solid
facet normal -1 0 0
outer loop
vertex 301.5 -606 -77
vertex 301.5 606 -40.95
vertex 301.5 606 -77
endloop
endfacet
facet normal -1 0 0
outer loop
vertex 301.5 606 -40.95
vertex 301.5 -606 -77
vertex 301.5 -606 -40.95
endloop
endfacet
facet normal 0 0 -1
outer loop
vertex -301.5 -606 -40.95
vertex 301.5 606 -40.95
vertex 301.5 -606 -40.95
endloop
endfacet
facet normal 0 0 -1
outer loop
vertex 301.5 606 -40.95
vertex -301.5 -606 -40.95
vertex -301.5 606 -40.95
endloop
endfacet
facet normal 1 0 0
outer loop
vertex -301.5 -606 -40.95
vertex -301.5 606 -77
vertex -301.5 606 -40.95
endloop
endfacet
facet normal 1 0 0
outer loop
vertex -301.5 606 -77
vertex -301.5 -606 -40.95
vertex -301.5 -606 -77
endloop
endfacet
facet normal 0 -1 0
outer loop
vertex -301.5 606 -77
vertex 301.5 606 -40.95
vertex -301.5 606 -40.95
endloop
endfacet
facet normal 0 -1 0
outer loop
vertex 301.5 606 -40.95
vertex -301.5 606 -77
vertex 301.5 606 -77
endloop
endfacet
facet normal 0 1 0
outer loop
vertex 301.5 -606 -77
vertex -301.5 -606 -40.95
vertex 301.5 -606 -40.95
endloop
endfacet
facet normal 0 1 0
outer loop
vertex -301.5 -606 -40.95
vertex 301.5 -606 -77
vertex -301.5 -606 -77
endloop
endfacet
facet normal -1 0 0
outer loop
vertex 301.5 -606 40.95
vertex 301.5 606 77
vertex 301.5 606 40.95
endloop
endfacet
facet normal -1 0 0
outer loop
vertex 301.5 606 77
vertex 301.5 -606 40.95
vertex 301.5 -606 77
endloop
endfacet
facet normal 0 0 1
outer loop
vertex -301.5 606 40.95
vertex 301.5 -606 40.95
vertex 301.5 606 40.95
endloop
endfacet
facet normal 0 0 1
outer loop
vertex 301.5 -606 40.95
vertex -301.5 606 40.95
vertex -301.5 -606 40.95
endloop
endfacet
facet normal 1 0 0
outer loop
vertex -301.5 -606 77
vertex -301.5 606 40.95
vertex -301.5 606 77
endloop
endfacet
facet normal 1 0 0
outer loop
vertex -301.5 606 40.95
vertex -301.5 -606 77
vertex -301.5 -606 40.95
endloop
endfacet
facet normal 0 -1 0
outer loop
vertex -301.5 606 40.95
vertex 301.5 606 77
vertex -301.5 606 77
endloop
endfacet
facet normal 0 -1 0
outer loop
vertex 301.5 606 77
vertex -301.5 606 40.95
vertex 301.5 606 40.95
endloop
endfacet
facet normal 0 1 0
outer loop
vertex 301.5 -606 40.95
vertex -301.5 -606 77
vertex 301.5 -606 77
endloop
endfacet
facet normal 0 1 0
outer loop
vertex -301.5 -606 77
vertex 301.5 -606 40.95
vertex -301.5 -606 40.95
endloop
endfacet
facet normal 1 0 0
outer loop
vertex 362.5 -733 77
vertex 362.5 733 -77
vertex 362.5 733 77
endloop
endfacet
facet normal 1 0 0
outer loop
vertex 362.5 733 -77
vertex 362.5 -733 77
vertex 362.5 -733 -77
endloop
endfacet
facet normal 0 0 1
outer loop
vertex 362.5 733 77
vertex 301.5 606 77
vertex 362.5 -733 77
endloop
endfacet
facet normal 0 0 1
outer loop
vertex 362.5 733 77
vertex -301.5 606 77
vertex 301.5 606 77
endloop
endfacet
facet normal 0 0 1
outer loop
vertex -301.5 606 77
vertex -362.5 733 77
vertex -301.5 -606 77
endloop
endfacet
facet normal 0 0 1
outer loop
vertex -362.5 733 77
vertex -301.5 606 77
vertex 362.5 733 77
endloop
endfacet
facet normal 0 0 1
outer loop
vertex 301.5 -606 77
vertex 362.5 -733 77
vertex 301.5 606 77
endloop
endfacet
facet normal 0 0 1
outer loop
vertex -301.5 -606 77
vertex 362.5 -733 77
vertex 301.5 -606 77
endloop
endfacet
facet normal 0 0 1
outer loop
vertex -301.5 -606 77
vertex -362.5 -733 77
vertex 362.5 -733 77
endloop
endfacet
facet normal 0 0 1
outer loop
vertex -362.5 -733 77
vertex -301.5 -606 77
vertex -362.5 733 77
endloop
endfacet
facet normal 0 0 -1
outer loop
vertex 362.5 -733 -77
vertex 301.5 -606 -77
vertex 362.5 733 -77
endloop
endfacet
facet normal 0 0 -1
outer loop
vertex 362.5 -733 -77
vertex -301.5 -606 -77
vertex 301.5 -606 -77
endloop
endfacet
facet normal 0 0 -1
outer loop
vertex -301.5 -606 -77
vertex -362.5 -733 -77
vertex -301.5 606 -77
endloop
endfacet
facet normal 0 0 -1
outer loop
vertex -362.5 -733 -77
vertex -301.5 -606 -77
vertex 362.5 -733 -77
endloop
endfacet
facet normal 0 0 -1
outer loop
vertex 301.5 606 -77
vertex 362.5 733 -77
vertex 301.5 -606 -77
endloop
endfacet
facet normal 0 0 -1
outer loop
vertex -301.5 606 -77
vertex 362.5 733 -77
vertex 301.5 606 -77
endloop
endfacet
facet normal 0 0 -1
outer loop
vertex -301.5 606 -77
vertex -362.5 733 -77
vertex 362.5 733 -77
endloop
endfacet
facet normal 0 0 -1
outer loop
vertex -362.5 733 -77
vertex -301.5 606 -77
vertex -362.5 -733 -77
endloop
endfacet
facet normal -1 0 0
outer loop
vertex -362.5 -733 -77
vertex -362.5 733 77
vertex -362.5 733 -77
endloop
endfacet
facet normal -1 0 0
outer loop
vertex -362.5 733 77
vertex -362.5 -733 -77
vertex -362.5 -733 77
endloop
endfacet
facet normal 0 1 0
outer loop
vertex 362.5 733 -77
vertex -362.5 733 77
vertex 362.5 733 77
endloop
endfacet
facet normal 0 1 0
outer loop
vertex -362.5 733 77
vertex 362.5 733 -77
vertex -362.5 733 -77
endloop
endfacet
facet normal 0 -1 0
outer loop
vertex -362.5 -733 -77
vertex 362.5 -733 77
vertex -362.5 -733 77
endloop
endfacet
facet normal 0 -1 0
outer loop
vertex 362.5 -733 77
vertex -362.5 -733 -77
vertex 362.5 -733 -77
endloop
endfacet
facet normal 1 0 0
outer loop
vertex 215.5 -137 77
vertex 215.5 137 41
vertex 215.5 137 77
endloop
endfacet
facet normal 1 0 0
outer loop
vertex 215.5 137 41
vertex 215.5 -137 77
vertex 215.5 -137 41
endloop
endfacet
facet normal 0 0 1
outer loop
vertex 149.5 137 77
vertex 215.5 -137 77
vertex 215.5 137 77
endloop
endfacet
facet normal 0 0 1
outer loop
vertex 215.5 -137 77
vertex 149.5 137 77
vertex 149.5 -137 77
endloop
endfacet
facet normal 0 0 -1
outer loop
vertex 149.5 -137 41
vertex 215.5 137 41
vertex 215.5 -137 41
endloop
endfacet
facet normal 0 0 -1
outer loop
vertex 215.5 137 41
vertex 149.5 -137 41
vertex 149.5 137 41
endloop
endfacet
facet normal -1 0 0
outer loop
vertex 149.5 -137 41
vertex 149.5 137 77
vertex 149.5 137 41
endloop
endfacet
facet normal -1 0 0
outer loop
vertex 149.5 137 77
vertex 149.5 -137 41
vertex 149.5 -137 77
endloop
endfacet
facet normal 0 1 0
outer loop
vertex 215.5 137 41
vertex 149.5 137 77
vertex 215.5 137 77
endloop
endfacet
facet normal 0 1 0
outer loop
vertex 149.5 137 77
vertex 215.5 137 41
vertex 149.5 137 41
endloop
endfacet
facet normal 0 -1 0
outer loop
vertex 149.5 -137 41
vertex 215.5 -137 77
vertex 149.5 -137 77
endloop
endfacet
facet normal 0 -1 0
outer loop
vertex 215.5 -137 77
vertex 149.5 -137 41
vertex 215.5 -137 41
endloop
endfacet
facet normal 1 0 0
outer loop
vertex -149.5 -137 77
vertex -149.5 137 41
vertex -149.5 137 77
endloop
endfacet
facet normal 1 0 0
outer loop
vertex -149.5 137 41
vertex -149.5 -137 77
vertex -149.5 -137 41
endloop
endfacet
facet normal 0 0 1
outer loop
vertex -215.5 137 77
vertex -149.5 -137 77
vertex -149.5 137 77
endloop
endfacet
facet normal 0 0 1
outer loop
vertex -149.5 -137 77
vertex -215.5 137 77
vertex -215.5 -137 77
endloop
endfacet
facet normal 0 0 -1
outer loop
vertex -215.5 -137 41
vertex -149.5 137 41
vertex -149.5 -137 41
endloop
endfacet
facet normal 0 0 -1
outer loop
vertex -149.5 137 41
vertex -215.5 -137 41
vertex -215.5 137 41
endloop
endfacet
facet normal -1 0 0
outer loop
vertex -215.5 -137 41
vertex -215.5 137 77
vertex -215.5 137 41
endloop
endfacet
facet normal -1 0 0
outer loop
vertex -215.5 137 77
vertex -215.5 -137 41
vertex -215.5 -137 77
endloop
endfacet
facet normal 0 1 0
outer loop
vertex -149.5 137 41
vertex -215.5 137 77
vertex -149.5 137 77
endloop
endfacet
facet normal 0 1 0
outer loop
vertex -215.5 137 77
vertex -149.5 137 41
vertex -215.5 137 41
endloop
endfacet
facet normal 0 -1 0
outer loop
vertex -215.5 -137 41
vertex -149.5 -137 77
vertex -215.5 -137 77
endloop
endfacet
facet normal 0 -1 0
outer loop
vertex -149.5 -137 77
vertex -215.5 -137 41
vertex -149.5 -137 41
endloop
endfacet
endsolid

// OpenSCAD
// Box dimensions
box_width = 725;
box_depth = 1466;
box_height = 154;

// Recess parameters
recess_depth = 36;
bezel_width_x = 61;
bezel_width_y = 127;

// Calculated recess dimensions
recess_width = box_width - (2 * bezel_width_x);
recess_depth_y = box_depth - (2 * bezel_width_y);

// Protruding box parameters
protrude_width = 66;
protrude_depth = 274;
protrude_height = 36;
protrude_x_offset = (recess_width/2) - 86 - (protrude_width/2); // 86 units from end of recess

union() {
    difference() {
        // Main box
        cube([box_width, box_depth, box_height], center=true);
        
        // Recess cutouts on top and bottom using a loop
        for (z_pos = [-(box_height - recess_depth) / 2, (box_height - recess_depth) / 2]) {
            translate([0, 0, z_pos]) {
                cube([recess_width, recess_depth_y, recess_depth + 0.1], center=true);
            }
        }
    }
    
    // Protruding boxes on both sides of the top recess area
    for (x_pos = [protrude_x_offset, -protrude_x_offset]) {
        translate([x_pos, 0, (box_height - recess_depth) / 2]) {
            cube([protrude_width, protrude_depth, protrude_height], center=true);
        }
    }
}
